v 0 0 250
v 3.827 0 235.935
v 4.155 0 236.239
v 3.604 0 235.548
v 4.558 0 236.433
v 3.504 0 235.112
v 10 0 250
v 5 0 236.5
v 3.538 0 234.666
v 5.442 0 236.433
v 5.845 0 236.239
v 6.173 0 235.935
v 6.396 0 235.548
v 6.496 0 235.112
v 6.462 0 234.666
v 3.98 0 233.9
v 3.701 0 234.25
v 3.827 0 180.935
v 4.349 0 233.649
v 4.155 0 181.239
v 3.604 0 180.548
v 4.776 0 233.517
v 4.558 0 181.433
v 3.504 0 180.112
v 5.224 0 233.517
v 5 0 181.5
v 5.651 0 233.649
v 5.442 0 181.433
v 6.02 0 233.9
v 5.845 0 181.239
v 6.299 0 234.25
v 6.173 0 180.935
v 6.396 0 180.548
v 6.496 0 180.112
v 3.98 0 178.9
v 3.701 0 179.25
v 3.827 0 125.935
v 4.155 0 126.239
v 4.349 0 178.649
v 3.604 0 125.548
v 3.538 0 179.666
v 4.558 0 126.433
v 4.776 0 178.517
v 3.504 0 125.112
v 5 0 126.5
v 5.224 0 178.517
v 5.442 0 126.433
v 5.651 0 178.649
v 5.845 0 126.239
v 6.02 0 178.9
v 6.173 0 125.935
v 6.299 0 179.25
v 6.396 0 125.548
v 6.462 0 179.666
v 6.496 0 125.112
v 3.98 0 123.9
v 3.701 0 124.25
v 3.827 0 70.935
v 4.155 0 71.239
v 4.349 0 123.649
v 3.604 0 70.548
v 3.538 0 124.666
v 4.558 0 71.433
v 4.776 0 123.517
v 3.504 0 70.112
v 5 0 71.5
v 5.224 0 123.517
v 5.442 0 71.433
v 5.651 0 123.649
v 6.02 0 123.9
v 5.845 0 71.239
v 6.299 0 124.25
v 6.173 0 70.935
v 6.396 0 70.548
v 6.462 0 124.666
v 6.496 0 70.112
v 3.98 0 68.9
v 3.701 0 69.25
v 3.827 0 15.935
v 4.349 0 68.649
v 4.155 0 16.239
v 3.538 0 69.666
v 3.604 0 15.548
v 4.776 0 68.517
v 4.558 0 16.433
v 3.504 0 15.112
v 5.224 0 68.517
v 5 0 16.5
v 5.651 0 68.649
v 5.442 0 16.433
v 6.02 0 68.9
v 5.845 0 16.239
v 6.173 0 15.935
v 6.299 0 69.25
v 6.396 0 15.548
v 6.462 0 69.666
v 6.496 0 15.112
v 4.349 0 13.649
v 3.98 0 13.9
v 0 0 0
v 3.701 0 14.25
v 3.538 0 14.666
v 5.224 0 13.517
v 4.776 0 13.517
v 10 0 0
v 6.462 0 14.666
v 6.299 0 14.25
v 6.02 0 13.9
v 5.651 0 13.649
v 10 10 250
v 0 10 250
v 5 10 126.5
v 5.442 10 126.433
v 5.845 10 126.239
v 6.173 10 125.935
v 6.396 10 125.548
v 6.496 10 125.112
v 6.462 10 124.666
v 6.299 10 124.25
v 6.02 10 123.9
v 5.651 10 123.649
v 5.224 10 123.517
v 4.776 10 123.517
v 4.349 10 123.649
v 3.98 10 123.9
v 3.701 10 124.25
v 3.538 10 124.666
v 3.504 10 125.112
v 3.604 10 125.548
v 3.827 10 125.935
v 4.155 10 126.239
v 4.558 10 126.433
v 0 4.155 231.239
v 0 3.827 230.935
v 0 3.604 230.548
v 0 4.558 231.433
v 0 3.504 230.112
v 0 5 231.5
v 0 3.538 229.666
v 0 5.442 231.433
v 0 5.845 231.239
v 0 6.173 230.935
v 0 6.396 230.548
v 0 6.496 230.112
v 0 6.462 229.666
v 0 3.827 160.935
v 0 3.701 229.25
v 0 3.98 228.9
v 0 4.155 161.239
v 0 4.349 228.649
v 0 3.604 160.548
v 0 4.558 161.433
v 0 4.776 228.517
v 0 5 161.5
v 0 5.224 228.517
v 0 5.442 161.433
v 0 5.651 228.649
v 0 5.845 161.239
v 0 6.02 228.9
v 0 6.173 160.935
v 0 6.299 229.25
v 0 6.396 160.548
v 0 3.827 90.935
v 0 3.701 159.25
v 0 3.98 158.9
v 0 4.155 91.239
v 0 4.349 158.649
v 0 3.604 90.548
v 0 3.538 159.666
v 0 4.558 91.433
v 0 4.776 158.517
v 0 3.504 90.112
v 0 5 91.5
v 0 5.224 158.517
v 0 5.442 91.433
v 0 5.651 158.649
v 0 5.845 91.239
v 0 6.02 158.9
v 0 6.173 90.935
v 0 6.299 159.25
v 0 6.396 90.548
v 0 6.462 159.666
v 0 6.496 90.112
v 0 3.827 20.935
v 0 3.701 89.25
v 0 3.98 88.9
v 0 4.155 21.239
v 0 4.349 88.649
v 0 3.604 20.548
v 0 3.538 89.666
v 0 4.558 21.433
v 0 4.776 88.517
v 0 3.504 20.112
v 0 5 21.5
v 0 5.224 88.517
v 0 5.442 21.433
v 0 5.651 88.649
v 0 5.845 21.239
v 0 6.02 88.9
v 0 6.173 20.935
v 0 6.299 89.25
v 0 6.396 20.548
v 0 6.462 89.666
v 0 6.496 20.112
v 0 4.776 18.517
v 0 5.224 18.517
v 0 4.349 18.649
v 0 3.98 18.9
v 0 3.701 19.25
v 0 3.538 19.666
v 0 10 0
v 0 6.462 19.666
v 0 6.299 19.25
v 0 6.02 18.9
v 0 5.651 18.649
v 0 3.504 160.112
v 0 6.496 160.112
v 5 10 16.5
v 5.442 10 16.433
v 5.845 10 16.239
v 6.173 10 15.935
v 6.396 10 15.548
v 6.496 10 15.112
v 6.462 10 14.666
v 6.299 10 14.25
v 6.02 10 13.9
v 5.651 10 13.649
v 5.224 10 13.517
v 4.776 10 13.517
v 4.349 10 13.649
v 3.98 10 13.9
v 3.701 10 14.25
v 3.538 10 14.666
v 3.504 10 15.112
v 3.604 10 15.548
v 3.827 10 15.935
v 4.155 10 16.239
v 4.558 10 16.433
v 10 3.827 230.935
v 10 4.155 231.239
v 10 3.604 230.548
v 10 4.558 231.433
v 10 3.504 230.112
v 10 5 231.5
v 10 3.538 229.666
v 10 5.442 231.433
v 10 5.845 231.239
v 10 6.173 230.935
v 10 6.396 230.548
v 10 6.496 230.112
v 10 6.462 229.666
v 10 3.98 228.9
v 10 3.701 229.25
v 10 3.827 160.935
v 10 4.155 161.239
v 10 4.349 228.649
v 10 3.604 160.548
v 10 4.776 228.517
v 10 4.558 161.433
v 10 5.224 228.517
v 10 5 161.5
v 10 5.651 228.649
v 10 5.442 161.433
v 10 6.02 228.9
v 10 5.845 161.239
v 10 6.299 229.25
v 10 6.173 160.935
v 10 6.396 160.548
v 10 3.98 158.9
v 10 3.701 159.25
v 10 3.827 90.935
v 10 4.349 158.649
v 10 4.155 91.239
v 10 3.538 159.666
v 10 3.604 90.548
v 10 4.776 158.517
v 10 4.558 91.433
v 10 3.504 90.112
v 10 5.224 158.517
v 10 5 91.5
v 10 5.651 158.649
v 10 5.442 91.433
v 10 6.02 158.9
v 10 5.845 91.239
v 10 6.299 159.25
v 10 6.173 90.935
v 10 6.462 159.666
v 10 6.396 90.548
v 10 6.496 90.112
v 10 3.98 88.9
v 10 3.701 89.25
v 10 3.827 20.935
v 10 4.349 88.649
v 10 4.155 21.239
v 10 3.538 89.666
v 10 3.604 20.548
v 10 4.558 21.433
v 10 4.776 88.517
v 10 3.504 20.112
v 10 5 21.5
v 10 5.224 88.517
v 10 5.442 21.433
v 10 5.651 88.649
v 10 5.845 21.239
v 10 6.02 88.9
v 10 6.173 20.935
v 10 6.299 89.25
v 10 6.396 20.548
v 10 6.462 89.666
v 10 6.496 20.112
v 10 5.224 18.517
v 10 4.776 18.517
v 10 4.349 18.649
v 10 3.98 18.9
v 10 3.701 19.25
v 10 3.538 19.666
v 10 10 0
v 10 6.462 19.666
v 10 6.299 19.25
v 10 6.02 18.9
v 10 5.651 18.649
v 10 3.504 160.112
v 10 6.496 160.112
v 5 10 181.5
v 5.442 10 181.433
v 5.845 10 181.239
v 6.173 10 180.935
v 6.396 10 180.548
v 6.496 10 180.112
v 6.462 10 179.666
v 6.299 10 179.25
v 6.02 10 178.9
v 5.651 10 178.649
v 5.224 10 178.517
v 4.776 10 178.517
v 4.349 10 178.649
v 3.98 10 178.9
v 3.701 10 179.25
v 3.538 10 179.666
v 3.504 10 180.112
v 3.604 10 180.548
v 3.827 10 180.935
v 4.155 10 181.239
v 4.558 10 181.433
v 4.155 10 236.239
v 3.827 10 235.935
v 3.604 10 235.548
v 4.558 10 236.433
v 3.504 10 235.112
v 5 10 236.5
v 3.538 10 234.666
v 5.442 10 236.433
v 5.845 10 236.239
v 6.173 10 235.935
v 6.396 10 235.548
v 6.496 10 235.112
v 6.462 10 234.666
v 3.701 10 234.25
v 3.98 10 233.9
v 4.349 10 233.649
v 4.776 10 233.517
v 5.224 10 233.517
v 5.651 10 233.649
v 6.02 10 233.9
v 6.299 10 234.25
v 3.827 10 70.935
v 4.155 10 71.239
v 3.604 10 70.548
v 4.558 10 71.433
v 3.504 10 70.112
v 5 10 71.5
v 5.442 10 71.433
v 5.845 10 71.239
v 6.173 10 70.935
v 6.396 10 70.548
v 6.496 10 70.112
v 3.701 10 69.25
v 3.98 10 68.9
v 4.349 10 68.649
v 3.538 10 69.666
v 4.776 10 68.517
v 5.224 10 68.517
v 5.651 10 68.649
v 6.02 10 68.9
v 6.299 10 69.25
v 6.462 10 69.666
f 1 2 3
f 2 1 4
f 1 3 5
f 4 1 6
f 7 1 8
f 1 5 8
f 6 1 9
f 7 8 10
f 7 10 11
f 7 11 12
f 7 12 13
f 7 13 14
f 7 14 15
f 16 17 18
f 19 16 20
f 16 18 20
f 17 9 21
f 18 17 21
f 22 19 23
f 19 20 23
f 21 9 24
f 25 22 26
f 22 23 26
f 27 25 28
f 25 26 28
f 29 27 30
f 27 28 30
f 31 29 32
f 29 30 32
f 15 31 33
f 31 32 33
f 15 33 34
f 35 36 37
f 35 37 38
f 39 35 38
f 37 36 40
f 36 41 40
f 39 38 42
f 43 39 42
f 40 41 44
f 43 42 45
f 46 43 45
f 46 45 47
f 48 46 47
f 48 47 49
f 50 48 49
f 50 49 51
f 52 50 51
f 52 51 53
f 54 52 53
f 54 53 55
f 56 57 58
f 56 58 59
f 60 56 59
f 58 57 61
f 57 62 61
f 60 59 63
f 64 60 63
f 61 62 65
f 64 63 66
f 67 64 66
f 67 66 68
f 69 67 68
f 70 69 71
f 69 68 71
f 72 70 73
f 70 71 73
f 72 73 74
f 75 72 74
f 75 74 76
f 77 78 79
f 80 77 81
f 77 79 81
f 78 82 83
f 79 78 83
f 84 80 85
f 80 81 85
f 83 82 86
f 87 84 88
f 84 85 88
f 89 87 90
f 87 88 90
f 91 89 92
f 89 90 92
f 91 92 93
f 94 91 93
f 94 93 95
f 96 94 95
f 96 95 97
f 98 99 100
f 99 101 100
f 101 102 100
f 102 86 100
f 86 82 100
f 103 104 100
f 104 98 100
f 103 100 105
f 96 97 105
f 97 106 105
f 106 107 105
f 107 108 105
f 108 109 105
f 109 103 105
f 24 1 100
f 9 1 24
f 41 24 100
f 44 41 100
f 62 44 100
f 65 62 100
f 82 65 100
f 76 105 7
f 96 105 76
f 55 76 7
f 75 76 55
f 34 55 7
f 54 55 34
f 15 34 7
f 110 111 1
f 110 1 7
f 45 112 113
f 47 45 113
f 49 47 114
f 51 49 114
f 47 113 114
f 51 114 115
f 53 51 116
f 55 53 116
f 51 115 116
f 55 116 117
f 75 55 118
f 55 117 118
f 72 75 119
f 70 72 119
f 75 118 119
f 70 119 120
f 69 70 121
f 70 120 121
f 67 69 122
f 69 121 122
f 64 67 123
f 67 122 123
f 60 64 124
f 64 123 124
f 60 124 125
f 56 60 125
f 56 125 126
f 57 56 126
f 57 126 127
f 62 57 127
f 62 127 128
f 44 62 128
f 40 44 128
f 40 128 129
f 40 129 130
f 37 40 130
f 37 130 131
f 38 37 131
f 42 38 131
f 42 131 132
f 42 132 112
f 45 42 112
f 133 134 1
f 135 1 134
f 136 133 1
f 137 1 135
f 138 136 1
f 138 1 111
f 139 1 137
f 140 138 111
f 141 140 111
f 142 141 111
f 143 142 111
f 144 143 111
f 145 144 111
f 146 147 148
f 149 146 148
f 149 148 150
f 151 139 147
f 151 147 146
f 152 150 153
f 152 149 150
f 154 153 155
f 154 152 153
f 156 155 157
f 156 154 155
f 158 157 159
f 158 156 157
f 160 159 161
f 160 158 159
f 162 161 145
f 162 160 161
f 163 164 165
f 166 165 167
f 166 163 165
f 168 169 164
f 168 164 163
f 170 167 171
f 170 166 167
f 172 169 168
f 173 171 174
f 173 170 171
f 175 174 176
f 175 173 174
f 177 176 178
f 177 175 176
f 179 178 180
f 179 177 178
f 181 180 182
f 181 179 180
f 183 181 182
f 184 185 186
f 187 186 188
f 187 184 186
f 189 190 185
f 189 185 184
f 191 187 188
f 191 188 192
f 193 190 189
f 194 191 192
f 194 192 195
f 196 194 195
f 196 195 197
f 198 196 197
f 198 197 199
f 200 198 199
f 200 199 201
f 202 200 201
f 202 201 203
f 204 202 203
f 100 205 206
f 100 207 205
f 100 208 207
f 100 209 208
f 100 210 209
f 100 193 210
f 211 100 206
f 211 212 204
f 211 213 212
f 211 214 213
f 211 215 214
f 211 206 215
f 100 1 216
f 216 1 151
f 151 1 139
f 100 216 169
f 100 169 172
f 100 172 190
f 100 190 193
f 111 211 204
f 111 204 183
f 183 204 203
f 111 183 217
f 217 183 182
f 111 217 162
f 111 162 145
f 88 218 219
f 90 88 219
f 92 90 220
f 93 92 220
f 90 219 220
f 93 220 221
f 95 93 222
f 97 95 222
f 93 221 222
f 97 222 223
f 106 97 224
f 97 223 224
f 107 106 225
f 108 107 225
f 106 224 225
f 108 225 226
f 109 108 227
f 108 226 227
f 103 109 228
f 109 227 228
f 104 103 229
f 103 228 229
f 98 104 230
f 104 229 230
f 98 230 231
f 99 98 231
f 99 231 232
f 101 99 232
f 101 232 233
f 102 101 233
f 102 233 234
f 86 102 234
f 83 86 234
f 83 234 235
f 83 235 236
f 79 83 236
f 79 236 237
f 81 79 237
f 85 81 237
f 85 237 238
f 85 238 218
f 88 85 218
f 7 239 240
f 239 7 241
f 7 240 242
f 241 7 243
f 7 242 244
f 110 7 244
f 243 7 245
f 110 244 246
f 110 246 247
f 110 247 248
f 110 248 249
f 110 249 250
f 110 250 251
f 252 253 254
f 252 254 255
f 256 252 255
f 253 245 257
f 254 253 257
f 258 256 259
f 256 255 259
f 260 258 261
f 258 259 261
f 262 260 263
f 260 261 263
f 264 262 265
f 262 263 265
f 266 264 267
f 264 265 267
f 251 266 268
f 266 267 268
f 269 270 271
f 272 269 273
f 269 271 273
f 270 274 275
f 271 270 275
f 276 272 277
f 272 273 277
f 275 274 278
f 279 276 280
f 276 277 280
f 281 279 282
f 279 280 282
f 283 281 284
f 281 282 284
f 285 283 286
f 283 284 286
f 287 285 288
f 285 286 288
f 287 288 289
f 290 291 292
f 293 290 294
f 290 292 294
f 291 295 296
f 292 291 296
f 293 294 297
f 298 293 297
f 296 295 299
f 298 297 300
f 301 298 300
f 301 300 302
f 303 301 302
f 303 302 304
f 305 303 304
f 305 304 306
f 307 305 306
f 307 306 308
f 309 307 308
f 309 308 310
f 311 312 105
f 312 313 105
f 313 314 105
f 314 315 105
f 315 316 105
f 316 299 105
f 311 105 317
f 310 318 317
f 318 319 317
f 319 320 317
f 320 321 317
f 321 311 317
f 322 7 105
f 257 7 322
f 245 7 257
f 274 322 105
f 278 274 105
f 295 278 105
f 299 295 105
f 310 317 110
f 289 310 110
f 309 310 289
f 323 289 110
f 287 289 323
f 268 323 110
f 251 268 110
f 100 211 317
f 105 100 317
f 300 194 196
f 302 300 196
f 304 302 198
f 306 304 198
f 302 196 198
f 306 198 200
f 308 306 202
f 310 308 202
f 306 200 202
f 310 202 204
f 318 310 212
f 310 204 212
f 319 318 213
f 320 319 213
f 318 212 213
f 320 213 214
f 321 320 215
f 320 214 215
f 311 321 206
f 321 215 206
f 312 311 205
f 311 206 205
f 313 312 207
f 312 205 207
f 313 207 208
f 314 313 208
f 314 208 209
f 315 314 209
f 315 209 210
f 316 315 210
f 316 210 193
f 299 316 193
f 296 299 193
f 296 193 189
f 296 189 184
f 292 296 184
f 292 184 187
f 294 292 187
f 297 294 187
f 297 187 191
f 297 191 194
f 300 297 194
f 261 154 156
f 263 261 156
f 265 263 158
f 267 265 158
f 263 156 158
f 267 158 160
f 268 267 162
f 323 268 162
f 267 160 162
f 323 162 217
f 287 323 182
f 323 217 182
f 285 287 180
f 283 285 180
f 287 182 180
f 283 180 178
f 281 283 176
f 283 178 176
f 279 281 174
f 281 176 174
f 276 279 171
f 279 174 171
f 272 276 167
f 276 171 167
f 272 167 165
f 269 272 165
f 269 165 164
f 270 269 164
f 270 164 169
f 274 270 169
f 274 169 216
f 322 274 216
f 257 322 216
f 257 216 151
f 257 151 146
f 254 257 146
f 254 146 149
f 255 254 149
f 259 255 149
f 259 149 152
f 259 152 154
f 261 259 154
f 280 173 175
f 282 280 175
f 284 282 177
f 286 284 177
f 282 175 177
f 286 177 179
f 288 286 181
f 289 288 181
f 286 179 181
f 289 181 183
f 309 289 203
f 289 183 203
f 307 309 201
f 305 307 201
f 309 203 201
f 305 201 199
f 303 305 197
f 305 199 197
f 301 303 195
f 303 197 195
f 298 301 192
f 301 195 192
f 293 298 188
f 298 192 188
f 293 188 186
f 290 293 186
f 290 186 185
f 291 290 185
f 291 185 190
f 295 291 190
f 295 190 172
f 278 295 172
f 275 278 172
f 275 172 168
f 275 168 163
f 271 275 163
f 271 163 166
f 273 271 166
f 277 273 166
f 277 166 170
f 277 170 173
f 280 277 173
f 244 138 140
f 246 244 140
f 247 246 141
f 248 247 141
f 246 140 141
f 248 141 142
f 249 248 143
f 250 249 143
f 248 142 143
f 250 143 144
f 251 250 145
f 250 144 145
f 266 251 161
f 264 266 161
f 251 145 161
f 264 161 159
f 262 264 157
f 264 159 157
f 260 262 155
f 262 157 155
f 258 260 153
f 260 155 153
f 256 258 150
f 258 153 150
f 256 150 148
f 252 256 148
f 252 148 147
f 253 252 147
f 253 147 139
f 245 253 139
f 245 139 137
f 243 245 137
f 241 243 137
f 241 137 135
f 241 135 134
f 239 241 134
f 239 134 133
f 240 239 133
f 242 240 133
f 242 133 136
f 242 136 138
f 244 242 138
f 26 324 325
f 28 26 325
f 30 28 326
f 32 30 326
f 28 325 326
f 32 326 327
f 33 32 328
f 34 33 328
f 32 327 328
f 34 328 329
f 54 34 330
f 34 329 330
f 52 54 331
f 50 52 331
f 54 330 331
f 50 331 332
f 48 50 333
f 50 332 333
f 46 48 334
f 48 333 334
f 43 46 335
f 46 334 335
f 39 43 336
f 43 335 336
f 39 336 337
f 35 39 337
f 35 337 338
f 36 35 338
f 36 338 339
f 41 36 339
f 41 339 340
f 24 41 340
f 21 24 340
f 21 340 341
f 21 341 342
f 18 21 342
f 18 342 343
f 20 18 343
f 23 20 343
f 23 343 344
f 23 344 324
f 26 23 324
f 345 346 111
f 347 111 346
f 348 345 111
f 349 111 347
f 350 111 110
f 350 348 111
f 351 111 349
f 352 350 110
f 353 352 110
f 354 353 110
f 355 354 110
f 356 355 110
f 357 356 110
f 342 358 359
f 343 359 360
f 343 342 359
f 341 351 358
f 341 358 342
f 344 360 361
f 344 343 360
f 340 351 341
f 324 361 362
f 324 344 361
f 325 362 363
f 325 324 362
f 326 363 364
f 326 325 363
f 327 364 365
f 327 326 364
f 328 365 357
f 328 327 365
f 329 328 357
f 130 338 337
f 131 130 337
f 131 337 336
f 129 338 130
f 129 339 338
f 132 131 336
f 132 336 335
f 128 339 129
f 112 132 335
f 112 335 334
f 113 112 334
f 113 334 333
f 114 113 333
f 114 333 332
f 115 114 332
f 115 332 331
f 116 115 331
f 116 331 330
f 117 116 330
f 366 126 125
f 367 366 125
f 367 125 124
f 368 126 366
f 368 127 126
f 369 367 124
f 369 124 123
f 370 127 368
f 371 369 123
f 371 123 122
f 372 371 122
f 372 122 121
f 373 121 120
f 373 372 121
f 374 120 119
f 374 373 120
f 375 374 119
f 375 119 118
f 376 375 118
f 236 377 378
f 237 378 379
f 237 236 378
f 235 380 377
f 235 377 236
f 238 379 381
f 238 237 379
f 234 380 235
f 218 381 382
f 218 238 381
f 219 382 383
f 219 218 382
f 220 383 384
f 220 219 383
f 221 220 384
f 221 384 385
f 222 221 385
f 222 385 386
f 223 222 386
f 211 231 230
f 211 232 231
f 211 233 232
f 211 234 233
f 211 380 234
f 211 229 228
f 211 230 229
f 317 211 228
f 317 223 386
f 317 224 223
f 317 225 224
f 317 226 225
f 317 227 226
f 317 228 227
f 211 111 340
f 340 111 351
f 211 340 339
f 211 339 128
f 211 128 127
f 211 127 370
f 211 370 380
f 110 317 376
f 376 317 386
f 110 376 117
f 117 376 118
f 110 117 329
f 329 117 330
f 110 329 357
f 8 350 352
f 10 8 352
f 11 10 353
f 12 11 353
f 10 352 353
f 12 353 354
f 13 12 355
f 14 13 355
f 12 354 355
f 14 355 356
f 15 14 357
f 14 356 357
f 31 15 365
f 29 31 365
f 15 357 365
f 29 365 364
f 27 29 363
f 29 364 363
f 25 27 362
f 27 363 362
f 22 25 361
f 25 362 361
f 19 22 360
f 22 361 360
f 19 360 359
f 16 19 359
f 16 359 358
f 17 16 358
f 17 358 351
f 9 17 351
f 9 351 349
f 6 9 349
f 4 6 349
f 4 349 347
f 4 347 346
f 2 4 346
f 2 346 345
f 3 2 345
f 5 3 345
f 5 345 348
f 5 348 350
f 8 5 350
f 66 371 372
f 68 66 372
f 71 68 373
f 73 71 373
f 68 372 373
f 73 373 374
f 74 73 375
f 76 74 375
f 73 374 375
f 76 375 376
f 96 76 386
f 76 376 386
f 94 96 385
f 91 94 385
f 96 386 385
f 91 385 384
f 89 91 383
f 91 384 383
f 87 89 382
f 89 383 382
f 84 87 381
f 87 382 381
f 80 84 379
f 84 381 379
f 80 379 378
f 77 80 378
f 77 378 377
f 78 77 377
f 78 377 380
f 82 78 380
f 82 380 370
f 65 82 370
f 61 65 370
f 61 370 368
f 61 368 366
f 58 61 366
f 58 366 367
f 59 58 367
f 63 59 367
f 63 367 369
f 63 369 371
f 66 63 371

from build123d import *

# Parameters (mm, degrees)
SKETCH1_W          = 10
SKETCH1_H          = 10
EXTRUDE1_DEPTH     = 250
SKETCH4_R          = 1.5
CUT_EXTRUDE3_DEPTH = 251.399680511
LPATTERN2_COUNT    = 5
LPATTERN2_PITCH    = 55
SKETCH5_R          = 1.5
CUT_EXTRUDE4_DEPTH = 251.399680511


with BuildPart() as part:
    # Sketch1 → Extrude1 (new body)
    with BuildSketch(Plane.XY):
        with Locations((5, 5)):
            Rectangle(SKETCH1_W, SKETCH1_H)
    extrude(amount=EXTRUDE1_DEPTH)

    # Sketch4 → Cut-Extrude3 (cut, through all)
    with BuildSketch(Plane(origin=(0, 10, 0), x_dir=(-1, 0, 0), z_dir=(0, 1, 0))):
        with Locations(Location((-5, 15, 0), (0, 0, 90))):
            Circle(SKETCH4_R)
    cut_extrude3 = extrude(amount=-CUT_EXTRUDE3_DEPTH, mode=Mode.SUBTRACT)

    # LPattern2: Cut-Extrude3 ×5
    with Locations(*[(0, 0, i * LPATTERN2_PITCH) for i in range(1, LPATTERN2_COUNT)]):
        add(cut_extrude3, mode=Mode.SUBTRACT)

    # Sketch5 → Cut-Extrude4 (cut, through all)
    with BuildSketch(Plane.ZY):
        with Locations((20, 5)):
            Circle(SKETCH5_R)
        with Locations((90, 5)):
            Circle(SKETCH5_R)
        with Locations((230, 5)):
            Circle(SKETCH5_R)
        with Locations((160, 5)):
            Circle(SKETCH5_R)
    extrude(amount=-CUT_EXTRUDE4_DEPTH, mode=Mode.SUBTRACT)


solid = part.part
